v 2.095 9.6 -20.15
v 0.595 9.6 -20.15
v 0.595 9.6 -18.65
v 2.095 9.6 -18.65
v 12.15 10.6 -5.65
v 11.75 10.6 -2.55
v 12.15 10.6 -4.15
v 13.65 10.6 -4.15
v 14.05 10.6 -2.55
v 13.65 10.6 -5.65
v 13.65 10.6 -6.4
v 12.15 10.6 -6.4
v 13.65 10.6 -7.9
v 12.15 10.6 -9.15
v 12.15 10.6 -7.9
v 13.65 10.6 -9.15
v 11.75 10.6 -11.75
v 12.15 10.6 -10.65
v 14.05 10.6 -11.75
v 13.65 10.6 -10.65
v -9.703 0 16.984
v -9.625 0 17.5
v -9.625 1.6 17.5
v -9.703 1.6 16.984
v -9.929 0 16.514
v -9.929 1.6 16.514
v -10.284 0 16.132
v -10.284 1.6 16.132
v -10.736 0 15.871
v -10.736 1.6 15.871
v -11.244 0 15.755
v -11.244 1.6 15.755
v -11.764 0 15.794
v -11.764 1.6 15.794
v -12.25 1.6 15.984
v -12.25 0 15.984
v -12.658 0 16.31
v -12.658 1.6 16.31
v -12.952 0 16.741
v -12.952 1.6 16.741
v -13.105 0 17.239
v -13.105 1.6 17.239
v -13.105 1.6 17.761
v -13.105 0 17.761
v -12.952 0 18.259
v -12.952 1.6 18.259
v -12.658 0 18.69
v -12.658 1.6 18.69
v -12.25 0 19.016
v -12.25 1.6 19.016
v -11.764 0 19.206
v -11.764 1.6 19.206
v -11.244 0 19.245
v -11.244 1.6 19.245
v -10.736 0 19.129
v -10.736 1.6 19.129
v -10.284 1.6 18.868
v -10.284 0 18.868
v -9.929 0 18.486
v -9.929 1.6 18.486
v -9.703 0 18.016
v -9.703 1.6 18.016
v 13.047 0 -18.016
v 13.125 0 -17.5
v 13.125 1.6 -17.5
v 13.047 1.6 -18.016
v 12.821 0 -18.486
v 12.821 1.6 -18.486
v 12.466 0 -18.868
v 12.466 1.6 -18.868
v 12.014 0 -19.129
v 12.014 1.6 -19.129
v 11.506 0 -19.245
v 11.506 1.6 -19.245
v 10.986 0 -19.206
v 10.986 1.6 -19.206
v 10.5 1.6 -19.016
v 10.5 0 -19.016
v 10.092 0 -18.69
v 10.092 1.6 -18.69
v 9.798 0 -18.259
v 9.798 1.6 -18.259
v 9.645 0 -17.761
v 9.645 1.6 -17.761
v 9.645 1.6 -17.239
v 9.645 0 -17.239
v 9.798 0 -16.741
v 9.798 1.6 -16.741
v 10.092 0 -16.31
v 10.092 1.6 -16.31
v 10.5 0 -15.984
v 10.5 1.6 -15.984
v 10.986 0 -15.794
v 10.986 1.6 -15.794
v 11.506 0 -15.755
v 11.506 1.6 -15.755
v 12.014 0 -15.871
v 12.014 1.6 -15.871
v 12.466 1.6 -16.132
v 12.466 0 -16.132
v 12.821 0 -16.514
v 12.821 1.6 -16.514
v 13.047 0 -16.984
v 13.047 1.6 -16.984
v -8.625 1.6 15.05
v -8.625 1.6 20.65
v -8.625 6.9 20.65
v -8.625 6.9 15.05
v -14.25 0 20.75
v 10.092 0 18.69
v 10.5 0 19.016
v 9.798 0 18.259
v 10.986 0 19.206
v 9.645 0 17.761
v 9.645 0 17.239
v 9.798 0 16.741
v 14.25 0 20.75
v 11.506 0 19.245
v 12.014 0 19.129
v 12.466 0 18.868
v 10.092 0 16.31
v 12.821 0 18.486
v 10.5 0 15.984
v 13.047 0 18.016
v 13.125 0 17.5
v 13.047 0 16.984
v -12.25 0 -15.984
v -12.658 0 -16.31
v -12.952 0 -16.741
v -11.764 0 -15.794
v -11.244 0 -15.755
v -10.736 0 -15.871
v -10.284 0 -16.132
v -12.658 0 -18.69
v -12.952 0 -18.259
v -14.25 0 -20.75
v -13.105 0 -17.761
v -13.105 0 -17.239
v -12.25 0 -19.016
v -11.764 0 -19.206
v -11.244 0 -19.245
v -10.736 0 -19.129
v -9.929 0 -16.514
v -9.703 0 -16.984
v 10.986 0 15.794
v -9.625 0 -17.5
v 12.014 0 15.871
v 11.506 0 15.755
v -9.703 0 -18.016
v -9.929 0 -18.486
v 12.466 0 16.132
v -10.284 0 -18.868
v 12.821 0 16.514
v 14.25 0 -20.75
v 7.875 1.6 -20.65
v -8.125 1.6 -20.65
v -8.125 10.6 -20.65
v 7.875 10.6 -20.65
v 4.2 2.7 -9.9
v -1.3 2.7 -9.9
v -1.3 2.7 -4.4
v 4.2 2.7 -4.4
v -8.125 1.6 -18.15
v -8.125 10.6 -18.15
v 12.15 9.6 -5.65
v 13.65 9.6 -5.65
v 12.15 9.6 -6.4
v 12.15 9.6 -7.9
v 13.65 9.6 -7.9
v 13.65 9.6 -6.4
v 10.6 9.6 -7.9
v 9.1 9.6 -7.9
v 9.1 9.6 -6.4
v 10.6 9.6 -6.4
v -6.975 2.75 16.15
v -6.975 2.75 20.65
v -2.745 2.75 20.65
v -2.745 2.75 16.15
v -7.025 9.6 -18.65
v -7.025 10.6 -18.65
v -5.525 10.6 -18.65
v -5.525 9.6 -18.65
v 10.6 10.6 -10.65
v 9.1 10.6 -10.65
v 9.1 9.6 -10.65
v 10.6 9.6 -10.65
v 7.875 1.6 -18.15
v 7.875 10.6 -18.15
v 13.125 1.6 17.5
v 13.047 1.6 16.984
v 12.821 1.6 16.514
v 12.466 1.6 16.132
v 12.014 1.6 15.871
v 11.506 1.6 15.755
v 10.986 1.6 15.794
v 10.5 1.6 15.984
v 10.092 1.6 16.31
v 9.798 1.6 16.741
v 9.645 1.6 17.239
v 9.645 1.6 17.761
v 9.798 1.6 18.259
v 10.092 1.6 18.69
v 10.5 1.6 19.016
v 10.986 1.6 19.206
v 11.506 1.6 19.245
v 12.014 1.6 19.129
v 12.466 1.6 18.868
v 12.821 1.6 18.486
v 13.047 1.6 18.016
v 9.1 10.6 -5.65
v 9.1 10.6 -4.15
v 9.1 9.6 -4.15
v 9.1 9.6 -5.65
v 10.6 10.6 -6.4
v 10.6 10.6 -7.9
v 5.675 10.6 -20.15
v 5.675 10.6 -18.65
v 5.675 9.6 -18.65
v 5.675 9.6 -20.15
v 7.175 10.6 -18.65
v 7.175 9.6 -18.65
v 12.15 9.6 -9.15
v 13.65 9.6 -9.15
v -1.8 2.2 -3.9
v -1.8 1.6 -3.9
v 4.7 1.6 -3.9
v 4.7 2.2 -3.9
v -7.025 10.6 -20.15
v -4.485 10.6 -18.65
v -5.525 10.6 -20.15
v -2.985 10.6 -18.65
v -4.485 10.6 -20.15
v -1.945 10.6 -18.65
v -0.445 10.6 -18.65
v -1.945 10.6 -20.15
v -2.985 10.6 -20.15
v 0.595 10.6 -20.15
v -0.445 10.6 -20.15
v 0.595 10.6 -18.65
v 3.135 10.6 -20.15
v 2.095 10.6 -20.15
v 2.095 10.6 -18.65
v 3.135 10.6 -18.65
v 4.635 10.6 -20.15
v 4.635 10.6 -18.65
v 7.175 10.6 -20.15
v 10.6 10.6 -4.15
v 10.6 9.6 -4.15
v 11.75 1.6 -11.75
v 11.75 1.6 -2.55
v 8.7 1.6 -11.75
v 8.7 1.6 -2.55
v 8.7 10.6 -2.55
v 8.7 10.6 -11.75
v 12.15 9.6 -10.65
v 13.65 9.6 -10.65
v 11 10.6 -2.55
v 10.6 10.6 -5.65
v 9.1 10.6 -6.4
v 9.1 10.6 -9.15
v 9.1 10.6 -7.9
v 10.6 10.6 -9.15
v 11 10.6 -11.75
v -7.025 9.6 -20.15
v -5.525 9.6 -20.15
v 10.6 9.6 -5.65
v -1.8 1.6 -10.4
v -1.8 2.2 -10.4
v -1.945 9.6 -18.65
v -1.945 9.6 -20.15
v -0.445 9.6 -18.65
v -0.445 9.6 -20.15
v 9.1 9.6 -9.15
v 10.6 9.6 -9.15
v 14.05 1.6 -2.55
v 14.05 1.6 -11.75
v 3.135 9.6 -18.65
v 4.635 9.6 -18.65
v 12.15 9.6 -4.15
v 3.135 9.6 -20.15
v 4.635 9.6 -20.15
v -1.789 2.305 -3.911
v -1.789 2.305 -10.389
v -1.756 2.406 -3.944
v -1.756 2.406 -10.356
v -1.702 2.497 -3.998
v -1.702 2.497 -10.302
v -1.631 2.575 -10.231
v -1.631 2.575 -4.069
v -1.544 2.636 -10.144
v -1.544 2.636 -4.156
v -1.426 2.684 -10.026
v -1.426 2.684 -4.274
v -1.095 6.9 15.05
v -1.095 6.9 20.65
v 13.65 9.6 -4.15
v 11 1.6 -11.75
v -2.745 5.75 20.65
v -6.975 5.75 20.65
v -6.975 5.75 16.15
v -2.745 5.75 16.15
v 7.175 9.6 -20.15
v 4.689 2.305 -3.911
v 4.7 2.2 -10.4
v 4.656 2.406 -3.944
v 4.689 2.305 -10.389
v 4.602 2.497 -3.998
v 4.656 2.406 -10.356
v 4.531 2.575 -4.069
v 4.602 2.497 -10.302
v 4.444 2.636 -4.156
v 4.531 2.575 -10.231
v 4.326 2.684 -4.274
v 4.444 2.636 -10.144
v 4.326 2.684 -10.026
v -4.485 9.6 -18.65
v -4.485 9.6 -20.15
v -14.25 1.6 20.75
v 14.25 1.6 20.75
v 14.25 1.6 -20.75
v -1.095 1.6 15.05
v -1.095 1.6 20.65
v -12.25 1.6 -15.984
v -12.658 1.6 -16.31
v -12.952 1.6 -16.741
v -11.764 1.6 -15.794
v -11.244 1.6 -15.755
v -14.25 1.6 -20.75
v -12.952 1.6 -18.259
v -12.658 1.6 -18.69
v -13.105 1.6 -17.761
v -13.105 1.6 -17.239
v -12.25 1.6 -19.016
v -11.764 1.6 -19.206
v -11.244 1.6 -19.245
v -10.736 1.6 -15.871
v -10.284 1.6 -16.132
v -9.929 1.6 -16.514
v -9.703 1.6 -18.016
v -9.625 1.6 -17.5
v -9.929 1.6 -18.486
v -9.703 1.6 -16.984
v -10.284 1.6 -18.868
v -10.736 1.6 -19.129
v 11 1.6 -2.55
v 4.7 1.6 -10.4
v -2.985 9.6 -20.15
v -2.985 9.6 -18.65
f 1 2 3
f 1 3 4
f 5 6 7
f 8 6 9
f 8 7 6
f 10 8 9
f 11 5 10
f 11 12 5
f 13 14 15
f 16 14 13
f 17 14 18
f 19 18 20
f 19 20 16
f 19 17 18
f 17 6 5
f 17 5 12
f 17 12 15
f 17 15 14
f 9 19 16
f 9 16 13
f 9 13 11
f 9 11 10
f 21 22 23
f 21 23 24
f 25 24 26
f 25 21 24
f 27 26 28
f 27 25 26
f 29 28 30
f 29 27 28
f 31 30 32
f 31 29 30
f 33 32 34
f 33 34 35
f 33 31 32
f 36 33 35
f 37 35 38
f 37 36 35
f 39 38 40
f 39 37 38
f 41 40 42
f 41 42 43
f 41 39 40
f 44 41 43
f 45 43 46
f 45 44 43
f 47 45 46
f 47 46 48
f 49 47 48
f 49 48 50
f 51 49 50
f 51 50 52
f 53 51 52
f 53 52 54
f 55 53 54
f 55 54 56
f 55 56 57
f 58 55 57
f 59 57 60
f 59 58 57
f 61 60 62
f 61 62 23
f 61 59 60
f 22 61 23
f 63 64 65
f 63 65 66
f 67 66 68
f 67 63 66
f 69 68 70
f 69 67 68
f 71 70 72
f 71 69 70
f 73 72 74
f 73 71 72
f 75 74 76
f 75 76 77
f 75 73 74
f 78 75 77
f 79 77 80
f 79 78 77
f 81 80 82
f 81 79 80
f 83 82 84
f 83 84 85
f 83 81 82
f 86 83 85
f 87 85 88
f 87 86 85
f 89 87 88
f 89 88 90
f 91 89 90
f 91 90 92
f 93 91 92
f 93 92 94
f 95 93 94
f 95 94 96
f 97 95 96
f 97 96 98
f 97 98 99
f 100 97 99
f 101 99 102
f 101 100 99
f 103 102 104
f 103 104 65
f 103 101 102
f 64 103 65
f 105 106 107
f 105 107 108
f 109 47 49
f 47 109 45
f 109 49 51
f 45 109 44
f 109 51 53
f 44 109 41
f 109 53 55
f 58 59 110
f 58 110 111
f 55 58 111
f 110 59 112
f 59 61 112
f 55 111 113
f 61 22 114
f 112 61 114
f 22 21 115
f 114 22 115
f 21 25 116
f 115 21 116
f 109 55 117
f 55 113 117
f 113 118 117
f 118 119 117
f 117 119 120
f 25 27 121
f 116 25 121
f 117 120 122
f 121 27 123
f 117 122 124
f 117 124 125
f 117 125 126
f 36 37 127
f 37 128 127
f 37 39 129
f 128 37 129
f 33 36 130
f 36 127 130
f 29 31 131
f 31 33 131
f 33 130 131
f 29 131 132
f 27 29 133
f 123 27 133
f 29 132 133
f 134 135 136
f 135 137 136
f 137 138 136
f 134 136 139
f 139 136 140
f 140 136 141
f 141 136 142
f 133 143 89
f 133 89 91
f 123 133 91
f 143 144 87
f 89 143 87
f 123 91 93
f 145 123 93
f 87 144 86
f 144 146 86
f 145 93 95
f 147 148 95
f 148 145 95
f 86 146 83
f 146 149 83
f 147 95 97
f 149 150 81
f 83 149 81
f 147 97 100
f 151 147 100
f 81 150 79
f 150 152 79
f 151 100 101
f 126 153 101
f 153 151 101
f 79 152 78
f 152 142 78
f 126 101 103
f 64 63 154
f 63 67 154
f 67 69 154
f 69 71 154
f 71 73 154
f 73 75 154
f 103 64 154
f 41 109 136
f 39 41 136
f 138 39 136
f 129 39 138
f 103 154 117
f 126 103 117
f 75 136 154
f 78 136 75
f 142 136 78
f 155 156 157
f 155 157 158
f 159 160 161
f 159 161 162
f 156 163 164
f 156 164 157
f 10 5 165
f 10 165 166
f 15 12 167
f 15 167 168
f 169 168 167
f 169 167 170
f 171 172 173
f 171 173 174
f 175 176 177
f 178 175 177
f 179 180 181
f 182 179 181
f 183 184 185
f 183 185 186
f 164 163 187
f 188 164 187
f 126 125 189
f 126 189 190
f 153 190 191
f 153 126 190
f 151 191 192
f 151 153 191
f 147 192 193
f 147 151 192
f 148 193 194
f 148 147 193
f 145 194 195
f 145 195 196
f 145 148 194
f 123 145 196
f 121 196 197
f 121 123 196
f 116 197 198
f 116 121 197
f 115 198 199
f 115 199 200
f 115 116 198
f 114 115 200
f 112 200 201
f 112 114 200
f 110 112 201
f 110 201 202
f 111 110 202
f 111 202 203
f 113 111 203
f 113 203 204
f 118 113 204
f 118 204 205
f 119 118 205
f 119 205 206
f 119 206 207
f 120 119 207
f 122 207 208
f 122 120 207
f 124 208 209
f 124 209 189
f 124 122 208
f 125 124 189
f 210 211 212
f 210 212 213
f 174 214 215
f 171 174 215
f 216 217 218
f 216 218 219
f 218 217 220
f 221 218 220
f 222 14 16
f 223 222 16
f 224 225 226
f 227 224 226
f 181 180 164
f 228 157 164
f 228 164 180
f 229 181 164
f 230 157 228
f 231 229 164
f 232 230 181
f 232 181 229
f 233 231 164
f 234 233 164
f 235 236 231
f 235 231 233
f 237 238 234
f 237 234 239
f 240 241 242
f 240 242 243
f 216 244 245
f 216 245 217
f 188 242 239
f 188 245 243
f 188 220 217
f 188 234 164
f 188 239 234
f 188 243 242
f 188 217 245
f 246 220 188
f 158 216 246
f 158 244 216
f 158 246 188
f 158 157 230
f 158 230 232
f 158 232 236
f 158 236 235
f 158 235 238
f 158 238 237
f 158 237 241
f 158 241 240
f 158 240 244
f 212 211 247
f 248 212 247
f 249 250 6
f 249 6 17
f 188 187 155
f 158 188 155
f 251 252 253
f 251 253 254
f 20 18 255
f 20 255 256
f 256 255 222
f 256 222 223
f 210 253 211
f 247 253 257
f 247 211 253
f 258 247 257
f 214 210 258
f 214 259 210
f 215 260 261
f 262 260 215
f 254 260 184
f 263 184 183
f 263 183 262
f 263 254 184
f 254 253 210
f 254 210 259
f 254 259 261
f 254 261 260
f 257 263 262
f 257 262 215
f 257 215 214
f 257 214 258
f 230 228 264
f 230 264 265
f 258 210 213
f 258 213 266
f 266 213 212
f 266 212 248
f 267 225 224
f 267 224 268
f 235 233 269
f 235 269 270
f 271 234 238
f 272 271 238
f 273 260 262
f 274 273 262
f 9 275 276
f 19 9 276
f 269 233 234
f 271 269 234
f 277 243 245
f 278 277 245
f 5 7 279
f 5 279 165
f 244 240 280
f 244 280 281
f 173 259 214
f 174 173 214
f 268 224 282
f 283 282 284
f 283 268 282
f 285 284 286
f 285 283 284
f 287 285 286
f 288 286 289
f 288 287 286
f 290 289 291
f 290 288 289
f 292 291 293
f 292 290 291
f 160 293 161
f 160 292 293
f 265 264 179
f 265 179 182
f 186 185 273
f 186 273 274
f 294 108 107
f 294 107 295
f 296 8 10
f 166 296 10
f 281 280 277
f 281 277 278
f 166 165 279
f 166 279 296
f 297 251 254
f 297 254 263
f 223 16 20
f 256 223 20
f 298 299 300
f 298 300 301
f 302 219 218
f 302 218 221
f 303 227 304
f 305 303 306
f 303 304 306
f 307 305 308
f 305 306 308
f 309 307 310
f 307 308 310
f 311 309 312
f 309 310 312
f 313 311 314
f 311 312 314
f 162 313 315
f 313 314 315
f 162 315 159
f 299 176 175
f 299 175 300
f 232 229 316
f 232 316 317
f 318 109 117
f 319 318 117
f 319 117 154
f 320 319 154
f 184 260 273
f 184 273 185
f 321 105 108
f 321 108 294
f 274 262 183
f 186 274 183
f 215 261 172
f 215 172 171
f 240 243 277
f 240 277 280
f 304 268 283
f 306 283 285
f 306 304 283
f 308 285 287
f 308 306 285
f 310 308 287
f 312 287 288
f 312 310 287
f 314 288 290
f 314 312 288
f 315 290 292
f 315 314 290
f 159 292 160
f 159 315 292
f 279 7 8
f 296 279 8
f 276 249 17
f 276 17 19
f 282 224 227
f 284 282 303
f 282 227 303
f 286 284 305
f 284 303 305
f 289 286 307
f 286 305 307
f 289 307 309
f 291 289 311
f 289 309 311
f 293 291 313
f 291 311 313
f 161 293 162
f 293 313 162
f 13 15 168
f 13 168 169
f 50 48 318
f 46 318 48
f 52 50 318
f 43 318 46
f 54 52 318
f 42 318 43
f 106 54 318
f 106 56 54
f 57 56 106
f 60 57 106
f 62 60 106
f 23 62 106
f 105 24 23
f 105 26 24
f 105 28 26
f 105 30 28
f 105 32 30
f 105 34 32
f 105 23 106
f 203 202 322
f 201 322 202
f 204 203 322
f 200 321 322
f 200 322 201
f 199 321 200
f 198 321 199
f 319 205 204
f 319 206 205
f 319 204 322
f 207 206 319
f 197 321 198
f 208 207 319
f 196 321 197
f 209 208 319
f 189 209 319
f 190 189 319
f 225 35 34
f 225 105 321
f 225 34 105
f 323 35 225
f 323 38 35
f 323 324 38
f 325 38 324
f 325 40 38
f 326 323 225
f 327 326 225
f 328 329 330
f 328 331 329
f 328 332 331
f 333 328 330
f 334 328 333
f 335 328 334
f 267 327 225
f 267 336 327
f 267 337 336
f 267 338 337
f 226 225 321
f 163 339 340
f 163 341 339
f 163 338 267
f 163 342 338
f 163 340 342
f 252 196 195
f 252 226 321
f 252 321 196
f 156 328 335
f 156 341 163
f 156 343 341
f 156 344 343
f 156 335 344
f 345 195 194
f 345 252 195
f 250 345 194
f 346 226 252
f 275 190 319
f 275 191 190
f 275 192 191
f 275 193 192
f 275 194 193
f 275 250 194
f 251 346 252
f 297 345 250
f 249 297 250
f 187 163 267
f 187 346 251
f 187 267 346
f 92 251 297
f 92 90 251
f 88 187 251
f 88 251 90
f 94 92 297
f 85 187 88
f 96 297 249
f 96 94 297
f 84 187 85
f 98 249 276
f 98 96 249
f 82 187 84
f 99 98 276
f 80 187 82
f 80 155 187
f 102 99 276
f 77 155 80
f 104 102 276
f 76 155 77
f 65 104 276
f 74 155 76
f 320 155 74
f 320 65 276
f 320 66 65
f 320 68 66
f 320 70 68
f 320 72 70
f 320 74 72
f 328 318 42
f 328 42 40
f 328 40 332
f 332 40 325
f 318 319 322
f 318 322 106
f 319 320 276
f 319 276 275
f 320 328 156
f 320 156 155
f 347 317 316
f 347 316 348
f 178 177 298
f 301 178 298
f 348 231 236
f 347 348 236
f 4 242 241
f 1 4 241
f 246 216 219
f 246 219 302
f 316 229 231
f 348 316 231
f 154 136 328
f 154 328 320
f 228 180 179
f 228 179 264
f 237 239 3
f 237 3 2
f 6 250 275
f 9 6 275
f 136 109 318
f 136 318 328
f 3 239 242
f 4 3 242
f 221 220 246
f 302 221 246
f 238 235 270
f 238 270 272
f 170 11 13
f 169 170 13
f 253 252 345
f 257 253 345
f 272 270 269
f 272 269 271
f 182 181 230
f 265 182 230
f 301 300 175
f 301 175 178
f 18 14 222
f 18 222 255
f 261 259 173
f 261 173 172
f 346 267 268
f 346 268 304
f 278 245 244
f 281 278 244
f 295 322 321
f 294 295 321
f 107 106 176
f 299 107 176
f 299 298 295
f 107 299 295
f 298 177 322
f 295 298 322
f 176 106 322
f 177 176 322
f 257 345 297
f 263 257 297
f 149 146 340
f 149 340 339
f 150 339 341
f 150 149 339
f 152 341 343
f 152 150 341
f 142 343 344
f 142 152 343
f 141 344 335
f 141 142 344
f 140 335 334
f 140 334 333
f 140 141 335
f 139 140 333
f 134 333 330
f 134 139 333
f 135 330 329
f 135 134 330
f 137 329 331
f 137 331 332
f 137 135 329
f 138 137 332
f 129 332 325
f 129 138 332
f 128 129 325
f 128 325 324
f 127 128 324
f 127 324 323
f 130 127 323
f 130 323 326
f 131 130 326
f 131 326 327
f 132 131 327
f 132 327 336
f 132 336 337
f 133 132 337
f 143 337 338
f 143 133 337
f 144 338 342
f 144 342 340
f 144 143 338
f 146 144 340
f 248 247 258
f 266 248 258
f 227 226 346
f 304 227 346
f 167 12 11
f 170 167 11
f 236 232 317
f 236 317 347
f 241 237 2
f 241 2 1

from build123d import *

# Parameters (mm, degrees)
SKETCH1_W           = 28.5
SKETCH1_H           = 41.5
SKETCH1_R           = 1.75
BOSS_EXTRUDE1_DEPTH = 1.6
SKETCH2_W           = 2.3
SKETCH2_H           = 9.2
SKETCH2_W_2         = 16
SKETCH2_H_2         = 2.5
BOSS_EXTRUDE2_DEPTH = 9
SKETCH3_W           = 1.5
SKETCH3_H           = 1.5
CUT_EXTRUDE1_DEPTH  = 1
SKETCH4_W           = 6.5
SKETCH4_H           = 6.5
BOSS_EXTRUDE3_DEPTH = 1.1
FILLET1_R           = 0.5
SKETCH5_W           = 7.53
SKETCH5_H           = 5.6
BOSS_EXTRUDE4_DEPTH = 5.3
SKETCH6_W           = 4.23
SKETCH6_H           = 3
CUT_EXTRUDE2_DEPTH  = 4.5


with BuildPart() as part:
    # Sketch1 → Boss-Extrude1 (new body)
    with BuildSketch(Plane(origin=(0, 0, 0), x_dir=(1, 0, 0), z_dir=(0, 1, 0))):
        Rectangle(SKETCH1_W, SKETCH1_H)
        with Locations((11.375, 17.5)):
            Circle(SKETCH1_R, mode=Mode.SUBTRACT)
        with Locations((-11.375, 17.5)):
            Circle(SKETCH1_R, mode=Mode.SUBTRACT)
        with Locations((-11.375, -17.5)):
            Circle(SKETCH1_R, mode=Mode.SUBTRACT)
        with Locations((11.375, -17.5)):
            Circle(SKETCH1_R, mode=Mode.SUBTRACT)
    extrude(amount=BOSS_EXTRUDE1_DEPTH)

    # Sketch2 → Boss-Extrude2 (add)
    with BuildSketch(Plane(origin=(0, 1.6, 0), x_dir=(1, 0, 0), z_dir=(0, 1, 0))):
        with Locations((12.9, 7.15)):
            Rectangle(SKETCH2_W, SKETCH2_H)
        with Locations((9.85, 7.15)):
            Rectangle(SKETCH2_W, SKETCH2_H)
        with Locations((-0.125, 19.4)):
            Rectangle(SKETCH2_W_2, SKETCH2_H_2)
    extrude(amount=BOSS_EXTRUDE2_DEPTH)

    # Sketch3 → Cut-Extrude1 (cut)
    with BuildSketch(Plane(origin=(0, 10.6, 0), x_dir=(1, 0, 0), z_dir=(0, 1, 0))):
        with Locations((12.9, 7.15)):
            Rectangle(SKETCH3_W, SKETCH3_H)
        with Locations((12.9, 9.9)):
            Rectangle(SKETCH3_W, SKETCH3_H)
        with Locations((12.9, 4.9)):
            Rectangle(SKETCH3_W, SKETCH3_H)
        with Locations((9.85, 4.9)):
            Rectangle(SKETCH3_W, SKETCH3_H)
        with Locations((9.85, 7.15)):
            Rectangle(SKETCH3_W, SKETCH3_H)
        with Locations((9.85, 9.9)):
            Rectangle(SKETCH3_W, SKETCH3_H)
        with Locations((6.425, 19.4)):
            Rectangle(SKETCH3_W, SKETCH3_H)
        with Locations((3.885, 19.4)):
            Rectangle(SKETCH3_W, SKETCH3_H)
        with Locations((1.345, 19.4)):
            Rectangle(SKETCH3_W, SKETCH3_H)
        with Locations((-1.195, 19.4)):
            Rectangle(SKETCH3_W, SKETCH3_H)
        with Locations((-3.735, 19.4)):
            Rectangle(SKETCH3_W, SKETCH3_H)
        with Locations((-6.275, 19.4)):
            Rectangle(SKETCH3_W, SKETCH3_H)
    extrude(amount=-CUT_EXTRUDE1_DEPTH, mode=Mode.SUBTRACT)

    # Sketch4 → Boss-Extrude3 (add)
    with BuildSketch(Plane(origin=(0, 1.6, 0), x_dir=(1, 0, 0), z_dir=(0, 1, 0))):
        with Locations((1.45, 7.15)):
            Rectangle(SKETCH4_W, SKETCH4_H)
    extrude(amount=BOSS_EXTRUDE3_DEPTH)

    # Fillet1
    fillet1_edges = [part.edges().sort_by_distance(p)[0] for p in [
        (4.7, 2.7, -7.15),
        (1.45, 2.7, -10.4),
        (-1.8, 2.7, -7.15),
        (1.45, 2.7, -3.9),
    ]]
    fillet(fillet1_edges, radius=FILLET1_R)

    # Sketch5 → Boss-Extrude4 (add)
    with BuildSketch(Plane(origin=(0, 1.6, 0), x_dir=(1, 0, 0), z_dir=(0, 1, 0))):
        with Locations((-4.86, -17.85)):
            Rectangle(SKETCH5_W, SKETCH5_H)
    extrude(amount=BOSS_EXTRUDE4_DEPTH)

    # Sketch6 → Cut-Extrude2 (cut)
    with BuildSketch(Plane.XY.offset(20.65)):
        with Locations((-4.86, 4.25)):
            Rectangle(SKETCH6_W, SKETCH6_H)
    extrude(amount=-CUT_EXTRUDE2_DEPTH, mode=Mode.SUBTRACT)


solid = part.part
